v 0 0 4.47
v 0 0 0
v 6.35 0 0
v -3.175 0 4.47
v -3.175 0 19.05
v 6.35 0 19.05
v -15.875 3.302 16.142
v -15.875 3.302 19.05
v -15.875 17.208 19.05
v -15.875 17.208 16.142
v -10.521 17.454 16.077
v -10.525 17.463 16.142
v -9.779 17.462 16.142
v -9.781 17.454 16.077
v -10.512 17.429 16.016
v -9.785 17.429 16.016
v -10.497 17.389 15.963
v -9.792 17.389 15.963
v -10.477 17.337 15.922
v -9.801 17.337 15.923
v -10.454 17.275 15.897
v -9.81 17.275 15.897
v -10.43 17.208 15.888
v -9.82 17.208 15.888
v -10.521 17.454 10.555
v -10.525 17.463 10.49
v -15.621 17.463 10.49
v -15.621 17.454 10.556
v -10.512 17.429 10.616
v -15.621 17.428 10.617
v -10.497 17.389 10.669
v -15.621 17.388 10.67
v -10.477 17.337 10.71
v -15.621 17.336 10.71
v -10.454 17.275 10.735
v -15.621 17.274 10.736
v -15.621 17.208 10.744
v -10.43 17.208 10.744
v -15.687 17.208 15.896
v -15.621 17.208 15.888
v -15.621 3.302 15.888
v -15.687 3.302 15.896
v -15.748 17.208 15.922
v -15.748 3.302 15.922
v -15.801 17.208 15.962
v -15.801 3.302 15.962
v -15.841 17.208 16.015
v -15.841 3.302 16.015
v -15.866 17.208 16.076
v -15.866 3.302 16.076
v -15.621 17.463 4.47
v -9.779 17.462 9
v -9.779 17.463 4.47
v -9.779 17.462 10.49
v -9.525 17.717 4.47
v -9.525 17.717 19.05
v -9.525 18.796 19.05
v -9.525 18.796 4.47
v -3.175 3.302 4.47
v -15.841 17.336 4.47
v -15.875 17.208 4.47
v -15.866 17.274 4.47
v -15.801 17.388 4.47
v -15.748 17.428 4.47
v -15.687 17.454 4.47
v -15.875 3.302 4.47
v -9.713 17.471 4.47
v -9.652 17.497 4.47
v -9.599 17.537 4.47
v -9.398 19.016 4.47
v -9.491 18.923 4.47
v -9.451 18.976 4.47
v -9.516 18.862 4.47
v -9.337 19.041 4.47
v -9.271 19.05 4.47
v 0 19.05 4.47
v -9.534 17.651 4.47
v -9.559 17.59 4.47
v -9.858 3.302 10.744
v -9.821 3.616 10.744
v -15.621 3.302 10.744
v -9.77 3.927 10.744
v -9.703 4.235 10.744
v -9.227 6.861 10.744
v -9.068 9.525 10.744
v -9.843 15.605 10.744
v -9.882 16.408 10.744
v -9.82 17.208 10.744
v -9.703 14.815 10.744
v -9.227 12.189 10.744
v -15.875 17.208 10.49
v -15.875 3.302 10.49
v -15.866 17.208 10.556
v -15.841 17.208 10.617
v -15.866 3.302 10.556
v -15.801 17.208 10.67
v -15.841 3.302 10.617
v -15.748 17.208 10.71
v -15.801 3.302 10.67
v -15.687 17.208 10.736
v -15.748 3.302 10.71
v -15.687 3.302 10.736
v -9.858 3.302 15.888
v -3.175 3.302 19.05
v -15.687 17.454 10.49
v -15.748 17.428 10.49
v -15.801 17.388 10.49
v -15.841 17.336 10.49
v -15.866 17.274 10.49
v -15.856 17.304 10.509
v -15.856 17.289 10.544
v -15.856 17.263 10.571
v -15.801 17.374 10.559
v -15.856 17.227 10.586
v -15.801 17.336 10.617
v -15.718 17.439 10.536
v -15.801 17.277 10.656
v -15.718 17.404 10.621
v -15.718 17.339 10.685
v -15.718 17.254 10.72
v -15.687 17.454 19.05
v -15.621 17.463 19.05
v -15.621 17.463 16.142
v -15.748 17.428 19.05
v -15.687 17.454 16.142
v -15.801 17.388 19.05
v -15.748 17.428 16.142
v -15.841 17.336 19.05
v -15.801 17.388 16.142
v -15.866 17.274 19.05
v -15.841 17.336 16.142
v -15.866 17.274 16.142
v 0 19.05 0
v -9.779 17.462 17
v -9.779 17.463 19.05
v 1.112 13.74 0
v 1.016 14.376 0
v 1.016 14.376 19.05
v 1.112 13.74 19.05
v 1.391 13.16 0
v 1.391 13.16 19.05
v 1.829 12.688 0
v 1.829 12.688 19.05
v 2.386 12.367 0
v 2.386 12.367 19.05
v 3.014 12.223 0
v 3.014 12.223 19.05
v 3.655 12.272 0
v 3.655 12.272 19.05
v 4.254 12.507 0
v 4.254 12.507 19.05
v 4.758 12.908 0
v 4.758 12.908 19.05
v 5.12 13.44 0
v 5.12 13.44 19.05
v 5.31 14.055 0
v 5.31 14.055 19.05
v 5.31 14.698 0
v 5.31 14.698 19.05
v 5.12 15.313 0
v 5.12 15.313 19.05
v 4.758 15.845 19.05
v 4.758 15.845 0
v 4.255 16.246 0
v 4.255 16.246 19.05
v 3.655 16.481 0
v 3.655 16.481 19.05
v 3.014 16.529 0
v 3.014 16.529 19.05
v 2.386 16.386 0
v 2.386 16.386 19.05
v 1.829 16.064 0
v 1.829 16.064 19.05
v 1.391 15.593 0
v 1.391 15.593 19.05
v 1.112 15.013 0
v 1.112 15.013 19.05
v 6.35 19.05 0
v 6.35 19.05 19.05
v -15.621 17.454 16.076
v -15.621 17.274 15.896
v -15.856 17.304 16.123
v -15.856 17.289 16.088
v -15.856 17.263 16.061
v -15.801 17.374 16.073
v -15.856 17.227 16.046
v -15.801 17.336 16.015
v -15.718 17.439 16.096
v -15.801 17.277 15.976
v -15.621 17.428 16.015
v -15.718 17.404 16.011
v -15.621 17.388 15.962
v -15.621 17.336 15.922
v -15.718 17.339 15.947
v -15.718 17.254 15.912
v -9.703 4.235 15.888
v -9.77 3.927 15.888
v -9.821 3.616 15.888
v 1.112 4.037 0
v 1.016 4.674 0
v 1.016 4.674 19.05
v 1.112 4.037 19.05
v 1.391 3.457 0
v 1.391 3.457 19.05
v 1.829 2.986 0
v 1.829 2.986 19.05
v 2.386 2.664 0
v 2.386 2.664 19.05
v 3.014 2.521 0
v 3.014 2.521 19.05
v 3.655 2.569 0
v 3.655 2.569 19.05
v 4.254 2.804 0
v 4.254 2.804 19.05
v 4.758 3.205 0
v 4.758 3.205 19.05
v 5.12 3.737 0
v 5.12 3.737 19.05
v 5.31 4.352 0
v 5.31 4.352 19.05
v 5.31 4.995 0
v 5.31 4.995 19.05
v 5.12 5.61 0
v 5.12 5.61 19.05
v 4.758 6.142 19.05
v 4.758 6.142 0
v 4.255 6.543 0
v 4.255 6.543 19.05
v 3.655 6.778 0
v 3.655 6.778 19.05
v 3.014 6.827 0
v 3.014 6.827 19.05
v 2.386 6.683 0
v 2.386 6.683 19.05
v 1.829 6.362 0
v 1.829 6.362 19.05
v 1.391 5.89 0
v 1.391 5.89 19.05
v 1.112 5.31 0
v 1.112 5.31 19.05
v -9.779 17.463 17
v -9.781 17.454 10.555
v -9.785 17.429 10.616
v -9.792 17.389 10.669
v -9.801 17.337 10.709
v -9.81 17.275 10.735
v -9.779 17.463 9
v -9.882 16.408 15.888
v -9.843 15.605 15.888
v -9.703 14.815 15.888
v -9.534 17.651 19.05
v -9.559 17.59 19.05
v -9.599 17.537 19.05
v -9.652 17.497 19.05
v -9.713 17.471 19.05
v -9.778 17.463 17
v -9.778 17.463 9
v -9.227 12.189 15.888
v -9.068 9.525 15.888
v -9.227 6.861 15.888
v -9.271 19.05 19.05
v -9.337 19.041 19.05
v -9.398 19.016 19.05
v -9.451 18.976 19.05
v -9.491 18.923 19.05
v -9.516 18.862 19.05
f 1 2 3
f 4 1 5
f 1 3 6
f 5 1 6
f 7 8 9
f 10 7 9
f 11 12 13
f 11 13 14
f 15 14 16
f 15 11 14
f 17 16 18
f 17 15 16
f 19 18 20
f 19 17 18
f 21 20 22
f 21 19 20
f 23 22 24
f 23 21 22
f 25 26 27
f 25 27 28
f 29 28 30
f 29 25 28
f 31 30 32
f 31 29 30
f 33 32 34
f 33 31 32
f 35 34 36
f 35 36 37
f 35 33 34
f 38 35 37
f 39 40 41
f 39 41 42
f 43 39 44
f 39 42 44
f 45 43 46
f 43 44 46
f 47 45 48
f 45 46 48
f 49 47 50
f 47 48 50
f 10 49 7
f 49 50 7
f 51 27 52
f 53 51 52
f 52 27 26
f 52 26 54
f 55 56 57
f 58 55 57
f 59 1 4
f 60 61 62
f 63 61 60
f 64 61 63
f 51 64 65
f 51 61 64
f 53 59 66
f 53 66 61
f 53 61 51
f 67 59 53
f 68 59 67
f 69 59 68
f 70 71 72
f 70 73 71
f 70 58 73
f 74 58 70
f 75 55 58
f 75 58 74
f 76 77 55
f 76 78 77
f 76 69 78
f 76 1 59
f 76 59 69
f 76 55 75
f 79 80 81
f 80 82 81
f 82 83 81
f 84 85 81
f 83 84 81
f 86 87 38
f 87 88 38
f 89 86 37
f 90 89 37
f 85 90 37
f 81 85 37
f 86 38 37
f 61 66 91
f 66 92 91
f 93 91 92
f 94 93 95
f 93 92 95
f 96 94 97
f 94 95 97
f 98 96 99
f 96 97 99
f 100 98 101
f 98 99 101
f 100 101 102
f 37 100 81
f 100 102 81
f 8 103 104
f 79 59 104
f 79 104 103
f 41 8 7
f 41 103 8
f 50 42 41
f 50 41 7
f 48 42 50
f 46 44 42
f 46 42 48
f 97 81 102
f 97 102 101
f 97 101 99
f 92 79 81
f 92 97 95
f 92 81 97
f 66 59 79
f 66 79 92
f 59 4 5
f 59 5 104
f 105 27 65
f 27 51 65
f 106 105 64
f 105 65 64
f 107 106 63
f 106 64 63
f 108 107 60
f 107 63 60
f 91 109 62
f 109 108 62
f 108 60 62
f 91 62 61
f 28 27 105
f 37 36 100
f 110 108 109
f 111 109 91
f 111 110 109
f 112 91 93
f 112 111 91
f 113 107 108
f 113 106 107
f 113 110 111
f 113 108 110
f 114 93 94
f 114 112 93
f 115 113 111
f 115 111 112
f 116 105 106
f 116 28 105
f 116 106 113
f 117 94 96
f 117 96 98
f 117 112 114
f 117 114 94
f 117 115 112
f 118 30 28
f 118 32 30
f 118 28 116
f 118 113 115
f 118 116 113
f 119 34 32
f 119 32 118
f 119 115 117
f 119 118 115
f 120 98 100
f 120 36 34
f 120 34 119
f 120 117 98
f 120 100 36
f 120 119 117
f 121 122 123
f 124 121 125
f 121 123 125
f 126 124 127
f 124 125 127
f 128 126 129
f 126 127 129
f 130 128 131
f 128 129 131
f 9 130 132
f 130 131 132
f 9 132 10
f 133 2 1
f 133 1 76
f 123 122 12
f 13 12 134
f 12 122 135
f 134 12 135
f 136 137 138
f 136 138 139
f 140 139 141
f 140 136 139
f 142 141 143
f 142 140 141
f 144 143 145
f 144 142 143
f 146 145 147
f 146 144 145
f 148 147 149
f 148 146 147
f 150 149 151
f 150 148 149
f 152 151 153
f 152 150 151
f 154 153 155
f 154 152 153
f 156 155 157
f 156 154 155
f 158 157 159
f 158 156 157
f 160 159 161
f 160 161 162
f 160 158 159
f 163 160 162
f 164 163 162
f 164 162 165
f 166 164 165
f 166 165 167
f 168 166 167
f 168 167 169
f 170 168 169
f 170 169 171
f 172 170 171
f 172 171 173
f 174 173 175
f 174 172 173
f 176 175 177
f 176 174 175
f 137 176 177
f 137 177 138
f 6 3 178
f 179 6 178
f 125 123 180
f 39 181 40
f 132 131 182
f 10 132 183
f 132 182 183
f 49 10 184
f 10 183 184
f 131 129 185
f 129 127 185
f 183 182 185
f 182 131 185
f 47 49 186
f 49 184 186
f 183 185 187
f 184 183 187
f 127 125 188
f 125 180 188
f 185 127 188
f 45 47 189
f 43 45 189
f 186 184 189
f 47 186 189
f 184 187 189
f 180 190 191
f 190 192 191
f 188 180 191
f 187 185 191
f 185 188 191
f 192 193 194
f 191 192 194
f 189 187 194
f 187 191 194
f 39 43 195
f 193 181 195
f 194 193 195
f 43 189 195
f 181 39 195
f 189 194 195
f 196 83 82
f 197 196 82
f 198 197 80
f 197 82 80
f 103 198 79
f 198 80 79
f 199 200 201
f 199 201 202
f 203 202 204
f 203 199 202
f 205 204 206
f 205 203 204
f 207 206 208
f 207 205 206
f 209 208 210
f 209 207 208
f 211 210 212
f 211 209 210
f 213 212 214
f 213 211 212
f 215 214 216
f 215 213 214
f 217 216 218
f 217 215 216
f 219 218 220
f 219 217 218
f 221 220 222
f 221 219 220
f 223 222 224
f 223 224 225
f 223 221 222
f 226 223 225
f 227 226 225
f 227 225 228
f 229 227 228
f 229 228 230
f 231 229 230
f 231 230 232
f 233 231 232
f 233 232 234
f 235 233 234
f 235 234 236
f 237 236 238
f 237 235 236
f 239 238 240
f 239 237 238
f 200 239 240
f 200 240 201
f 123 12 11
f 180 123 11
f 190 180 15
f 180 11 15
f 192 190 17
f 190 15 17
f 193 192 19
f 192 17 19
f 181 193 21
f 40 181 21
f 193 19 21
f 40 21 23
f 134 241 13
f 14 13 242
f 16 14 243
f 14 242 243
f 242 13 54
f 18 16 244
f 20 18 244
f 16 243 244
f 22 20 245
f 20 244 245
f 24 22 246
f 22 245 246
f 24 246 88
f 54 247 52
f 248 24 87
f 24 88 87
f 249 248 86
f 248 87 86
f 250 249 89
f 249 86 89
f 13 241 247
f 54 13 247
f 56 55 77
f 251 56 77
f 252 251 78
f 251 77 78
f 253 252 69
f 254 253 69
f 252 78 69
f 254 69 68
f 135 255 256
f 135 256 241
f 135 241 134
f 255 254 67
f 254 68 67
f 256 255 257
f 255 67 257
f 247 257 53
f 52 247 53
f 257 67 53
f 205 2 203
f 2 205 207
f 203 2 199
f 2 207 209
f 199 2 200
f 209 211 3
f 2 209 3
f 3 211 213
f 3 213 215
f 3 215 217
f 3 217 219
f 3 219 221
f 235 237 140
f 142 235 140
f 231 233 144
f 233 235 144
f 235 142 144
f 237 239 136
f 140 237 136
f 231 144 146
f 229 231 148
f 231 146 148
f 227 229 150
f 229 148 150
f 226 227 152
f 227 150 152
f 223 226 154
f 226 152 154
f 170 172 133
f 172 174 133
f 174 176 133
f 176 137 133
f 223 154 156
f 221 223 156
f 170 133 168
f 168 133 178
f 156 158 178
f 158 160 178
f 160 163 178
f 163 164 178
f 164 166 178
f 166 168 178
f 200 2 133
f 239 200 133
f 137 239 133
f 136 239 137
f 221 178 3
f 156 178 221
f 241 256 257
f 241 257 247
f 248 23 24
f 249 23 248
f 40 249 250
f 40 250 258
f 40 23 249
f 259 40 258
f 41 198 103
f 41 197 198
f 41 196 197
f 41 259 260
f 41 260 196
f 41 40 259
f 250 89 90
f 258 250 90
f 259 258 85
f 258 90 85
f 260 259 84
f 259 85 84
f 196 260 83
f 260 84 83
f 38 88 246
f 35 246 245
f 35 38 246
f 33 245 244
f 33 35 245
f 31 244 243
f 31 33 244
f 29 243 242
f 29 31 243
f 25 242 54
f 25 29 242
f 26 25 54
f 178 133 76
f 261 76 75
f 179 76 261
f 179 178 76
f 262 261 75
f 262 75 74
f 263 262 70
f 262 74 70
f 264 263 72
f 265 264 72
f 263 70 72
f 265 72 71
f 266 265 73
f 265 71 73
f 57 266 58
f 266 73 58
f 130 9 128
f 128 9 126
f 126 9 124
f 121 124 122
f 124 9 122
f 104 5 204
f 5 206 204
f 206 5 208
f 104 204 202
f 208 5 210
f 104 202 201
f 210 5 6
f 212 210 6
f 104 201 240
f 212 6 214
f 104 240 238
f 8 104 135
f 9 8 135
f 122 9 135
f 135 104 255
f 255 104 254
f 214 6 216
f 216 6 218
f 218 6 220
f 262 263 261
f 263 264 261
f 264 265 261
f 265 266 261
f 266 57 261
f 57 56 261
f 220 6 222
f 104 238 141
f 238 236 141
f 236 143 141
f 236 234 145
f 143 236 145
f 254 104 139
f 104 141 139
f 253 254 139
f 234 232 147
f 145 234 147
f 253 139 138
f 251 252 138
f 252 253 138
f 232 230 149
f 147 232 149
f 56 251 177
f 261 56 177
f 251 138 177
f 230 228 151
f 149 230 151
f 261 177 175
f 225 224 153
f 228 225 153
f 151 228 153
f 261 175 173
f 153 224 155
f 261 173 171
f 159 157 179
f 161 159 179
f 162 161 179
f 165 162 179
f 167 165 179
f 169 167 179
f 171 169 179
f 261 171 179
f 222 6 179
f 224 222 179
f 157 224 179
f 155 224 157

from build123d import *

# Parameters (mm, degrees)
SKETCH1_W           = 6.35
SKETCH1_H           = 19.05
SKETCH1_R           = 2.159
BOSS_EXTRUDE1_DEPTH = 19.05
SKETCH2_W           = 14.5796
SKETCH2_H           = 19.05
BOSS_EXTRUDE2_DEPTH = 19.05
SKETCH3_R           = 22.352
CUT_EXTRUDE1_DEPTH  = 2.57175
CUT_EXTRUDE2_REACH  = 34.996
SKETCH4_W           = 3.175
SKETCH4_H           = 19.05
CUT_EXTRUDE3_REACH  = 33.27
SKETCH6_W           = 6.35
SKETCH6_H           = 1.5875
FILLET2_R           = 0.254
FILLET3_START       = -15.6210001
FILLET3_DEPTH       = 5.918275981
FILLET3_START_2     = 9
FILLET3_2_DEPTH     = 8
CUT_EXTRUDE4_START  = -14.5796
CUT_EXTRUDE4_DEPTH  = 14.5796


with BuildPart() as part:
    # Sketch1 → Boss-Extrude1 (new body)
    with BuildSketch(Plane.XY):
        with Locations((3.175, 9.525)):
            Rectangle(SKETCH1_W, SKETCH1_H)
        with Locations(Location((3.175, 14.3764, 0), (0, 0, 180))):
            Circle(SKETCH1_R, mode=Mode.SUBTRACT)
        with Locations(Location((3.175, 4.6736, 0), (0, 0, 180))):
            Circle(SKETCH1_R, mode=Mode.SUBTRACT)
    extrude(amount=BOSS_EXTRUDE1_DEPTH)

    # Sketch2 → Boss-Extrude2 (add)
    with BuildSketch(Plane.ZY):
        with Locations((11.7602, 9.525)):
            Rectangle(SKETCH2_W, SKETCH2_H)
    extrude(amount=BOSS_EXTRUDE2_DEPTH)

    # Sketch3 → Cut-Extrude1 (cut, symmetric)
    with BuildSketch(Plane(origin=(0, 0, 13.31595), x_dir=(-1, 0, 0), z_dir=(0, 0, -1))):
        with Locations((31.4198, 9.525)):
            Circle(SKETCH3_R)
    extrude(amount=CUT_EXTRUDE1_DEPTH, both=True, mode=Mode.SUBTRACT)

    # Cut-Extrude2: up to this face of the body (flat: up to its plane)
    cut_extrude2_end = Plane(part.part.faces().sort_by_distance((3.175, 9.525, 0))[0])
    # Sketch4 → Cut-Extrude2 (cut, up to the picked face)
    with BuildSketch(Plane(origin=(0, 0, 19.05), x_dir=(-1, 0, 0), z_dir=(0, 0, -1)), mode=Mode.PRIVATE) as cut_extrude2_sk1:
        with Locations((17.4625, 9.525)):
            Rectangle(SKETCH4_W, SKETCH4_H)
    cut_extrude2_tool1 = split(extrude(cut_extrude2_sk1.sketch, amount=CUT_EXTRUDE2_REACH, mode=Mode.PRIVATE), bisect_by=cut_extrude2_end, keep=Keep.BOTH, mode=Mode.PRIVATE)
    add(cut_extrude2_tool1.solids().sort_by(Axis((-17.4625, 9.525, 19.05), (0, 0, -1)))[0], mode=Mode.SUBTRACT)

    # Sketch6 → Cut-Extrude3 (cut, up to next)
    with BuildSketch(Plane.XY.offset(19.05), mode=Mode.PRIVATE) as cut_extrude3_sk1:
        with Locations((-12.7, 0.79375)):
            Rectangle(SKETCH6_W, SKETCH6_H)
    cut_extrude3_tool1 = extrude(cut_extrude3_sk1.sketch, amount=-CUT_EXTRUDE3_REACH, mode=Mode.PRIVATE) & part.part
    # Sketch6 → Cut-Extrude3 (cut, up to next)
    with BuildSketch(Plane.XY.offset(19.05), mode=Mode.PRIVATE) as cut_extrude3_sk2:
        with Locations((-12.7, 18.25625)):
            Rectangle(SKETCH6_W, SKETCH6_H)
    cut_extrude3_tool2 = extrude(cut_extrude3_sk2.sketch, amount=-CUT_EXTRUDE3_REACH, mode=Mode.PRIVATE) & part.part
    add(cut_extrude3_tool1.solids().sort_by_distance((-12.7, 0.79375, 19.05))[0], mode=Mode.SUBTRACT)
    add(cut_extrude3_tool2.solids().sort_by_distance((-12.7, 18.25625, 19.05))[0], mode=Mode.SUBTRACT)

    # Fillet2
    fillet2_edges = [part.edges().sort_by_distance(p)[0] for p in [
        (-13.199816574, 1.5875, 10.7442),
        (-15.875, 1.5875, 7.6073),
        (-13.199816574, 1.5875, 15.8877),
        (-15.875, 1.5875, 17.46885),
        (-9.525, 1.5875, 11.7602),
        (-9.525, 0, 11.7602),
        (-13.199816574, 17.4625, 10.7442),
        (-9.525, 19.05, 11.7602),
        (-9.525, 17.4625, 11.7602),
        (-13.199816574, 17.4625, 15.8877),
        (-15.875, 17.4625, 7.6073),
        (-15.875, 17.4625, 17.46885),
        (-15.875, 9.525, 15.8877),
        (-15.875, 9.525, 10.7442),
    ]]
    fillet(fillet2_edges, radius=FILLET2_R)

    # Fillet3: read off the stored shape, not the designer's step
    # Fillet3 outline → Fillet3 (cut)
    with BuildSketch(Plane.YZ.offset(FILLET3_START)):
        with BuildLine():
            ThreePointArc((17.2085, 10.7442), (17.388105122, 10.669805122), (17.4625, 10.4902))
            Line((17.4625, 10.4902), (17.4625, 16.1417))
            ThreePointArc((17.4625, 16.1417), (17.388105122, 15.962094878), (17.2085, 15.8877))
            Line((17.2085, 15.8877), (1.8415, 15.8877))
            ThreePointArc((1.8415, 15.8877), (1.661894878, 15.962094878), (1.5875, 16.1417))
            Line((1.5875, 16.1417), (1.5875, 10.4902))
            ThreePointArc((1.5875, 10.4902), (1.661894878, 10.669805122), (1.8415, 10.7442))
            Line((1.8415, 10.7442), (17.2085, 10.7442))
        make_face()
    extrude(amount=FILLET3_DEPTH, mode=Mode.SUBTRACT)

    # Fillet3 2 outline → Fillet3 2 (add)
    with BuildSketch(Plane.XY.offset(FILLET3_START_2)):
        with BuildLine():
            ThreePointArc((-9.702724219, 4.235338054), (-9.880467378, 2.915439177), (-9.778999483, 1.587497181))
            Line((-9.778999483, 1.587497181), (-9.702724119, 1.5875))
            Line((-9.702724119, 1.5875), (-9.702724219, 4.235338054))
        make_face()
        with BuildLine():
            Line((-9.702724119, 17.4625), (-9.778999483, 17.462502819))
            ThreePointArc((-9.778999483, 17.462502819), (-9.880467378, 16.134560823), (-9.702724219, 14.814661946))
            Line((-9.702724219, 14.814661946), (-9.702724119, 17.4625))
        make_face()
    extrude(amount=FILLET3_2_DEPTH)

    # Cut-Extrude4: read off the stored shape, not the designer's step
    # Cut-Extrude4 outline → Cut-Extrude4 (cut)
    with BuildSketch(Plane.XY.offset(19.05).offset(CUT_EXTRUDE4_START)):
        with BuildLine():
            Line((-9.271, 0), (-3.175, 0))
            Line((-3.175, 0), (-3.175, 3.302))
            Line((-3.175, 3.302), (-9.857519432, 3.302))
            ThreePointArc((-9.857519432, 3.302), (-9.876451593, 2.442083536), (-9.778999483, 1.587497181))
            ThreePointArc((-9.778999483, 1.587497181), (-9.599394878, 1.513105122), (-9.525, 1.3335))
            Line((-9.525, 1.3335), (-9.525, 0.254))
            ThreePointArc((-9.525, 0.254), (-9.450605122, 0.074394878), (-9.271, 0))
        make_face()
        with BuildLine():
            ThreePointArc((-9.778999483, 1.587497181), (-9.876451593, 2.442083536), (-9.857519432, 3.302))
            Line((-9.857519432, 3.302), (-15.875, 3.302))
            Line((-15.875, 3.302), (-15.875, 1.8415))
            ThreePointArc((-15.875, 1.8415), (-15.800605122, 1.661894878), (-15.621, 1.5875))
            Line((-15.621, 1.5875), (-9.778999483, 1.587497181))
        make_face()
    extrude(amount=CUT_EXTRUDE4_DEPTH, mode=Mode.SUBTRACT)


solid = part.part
